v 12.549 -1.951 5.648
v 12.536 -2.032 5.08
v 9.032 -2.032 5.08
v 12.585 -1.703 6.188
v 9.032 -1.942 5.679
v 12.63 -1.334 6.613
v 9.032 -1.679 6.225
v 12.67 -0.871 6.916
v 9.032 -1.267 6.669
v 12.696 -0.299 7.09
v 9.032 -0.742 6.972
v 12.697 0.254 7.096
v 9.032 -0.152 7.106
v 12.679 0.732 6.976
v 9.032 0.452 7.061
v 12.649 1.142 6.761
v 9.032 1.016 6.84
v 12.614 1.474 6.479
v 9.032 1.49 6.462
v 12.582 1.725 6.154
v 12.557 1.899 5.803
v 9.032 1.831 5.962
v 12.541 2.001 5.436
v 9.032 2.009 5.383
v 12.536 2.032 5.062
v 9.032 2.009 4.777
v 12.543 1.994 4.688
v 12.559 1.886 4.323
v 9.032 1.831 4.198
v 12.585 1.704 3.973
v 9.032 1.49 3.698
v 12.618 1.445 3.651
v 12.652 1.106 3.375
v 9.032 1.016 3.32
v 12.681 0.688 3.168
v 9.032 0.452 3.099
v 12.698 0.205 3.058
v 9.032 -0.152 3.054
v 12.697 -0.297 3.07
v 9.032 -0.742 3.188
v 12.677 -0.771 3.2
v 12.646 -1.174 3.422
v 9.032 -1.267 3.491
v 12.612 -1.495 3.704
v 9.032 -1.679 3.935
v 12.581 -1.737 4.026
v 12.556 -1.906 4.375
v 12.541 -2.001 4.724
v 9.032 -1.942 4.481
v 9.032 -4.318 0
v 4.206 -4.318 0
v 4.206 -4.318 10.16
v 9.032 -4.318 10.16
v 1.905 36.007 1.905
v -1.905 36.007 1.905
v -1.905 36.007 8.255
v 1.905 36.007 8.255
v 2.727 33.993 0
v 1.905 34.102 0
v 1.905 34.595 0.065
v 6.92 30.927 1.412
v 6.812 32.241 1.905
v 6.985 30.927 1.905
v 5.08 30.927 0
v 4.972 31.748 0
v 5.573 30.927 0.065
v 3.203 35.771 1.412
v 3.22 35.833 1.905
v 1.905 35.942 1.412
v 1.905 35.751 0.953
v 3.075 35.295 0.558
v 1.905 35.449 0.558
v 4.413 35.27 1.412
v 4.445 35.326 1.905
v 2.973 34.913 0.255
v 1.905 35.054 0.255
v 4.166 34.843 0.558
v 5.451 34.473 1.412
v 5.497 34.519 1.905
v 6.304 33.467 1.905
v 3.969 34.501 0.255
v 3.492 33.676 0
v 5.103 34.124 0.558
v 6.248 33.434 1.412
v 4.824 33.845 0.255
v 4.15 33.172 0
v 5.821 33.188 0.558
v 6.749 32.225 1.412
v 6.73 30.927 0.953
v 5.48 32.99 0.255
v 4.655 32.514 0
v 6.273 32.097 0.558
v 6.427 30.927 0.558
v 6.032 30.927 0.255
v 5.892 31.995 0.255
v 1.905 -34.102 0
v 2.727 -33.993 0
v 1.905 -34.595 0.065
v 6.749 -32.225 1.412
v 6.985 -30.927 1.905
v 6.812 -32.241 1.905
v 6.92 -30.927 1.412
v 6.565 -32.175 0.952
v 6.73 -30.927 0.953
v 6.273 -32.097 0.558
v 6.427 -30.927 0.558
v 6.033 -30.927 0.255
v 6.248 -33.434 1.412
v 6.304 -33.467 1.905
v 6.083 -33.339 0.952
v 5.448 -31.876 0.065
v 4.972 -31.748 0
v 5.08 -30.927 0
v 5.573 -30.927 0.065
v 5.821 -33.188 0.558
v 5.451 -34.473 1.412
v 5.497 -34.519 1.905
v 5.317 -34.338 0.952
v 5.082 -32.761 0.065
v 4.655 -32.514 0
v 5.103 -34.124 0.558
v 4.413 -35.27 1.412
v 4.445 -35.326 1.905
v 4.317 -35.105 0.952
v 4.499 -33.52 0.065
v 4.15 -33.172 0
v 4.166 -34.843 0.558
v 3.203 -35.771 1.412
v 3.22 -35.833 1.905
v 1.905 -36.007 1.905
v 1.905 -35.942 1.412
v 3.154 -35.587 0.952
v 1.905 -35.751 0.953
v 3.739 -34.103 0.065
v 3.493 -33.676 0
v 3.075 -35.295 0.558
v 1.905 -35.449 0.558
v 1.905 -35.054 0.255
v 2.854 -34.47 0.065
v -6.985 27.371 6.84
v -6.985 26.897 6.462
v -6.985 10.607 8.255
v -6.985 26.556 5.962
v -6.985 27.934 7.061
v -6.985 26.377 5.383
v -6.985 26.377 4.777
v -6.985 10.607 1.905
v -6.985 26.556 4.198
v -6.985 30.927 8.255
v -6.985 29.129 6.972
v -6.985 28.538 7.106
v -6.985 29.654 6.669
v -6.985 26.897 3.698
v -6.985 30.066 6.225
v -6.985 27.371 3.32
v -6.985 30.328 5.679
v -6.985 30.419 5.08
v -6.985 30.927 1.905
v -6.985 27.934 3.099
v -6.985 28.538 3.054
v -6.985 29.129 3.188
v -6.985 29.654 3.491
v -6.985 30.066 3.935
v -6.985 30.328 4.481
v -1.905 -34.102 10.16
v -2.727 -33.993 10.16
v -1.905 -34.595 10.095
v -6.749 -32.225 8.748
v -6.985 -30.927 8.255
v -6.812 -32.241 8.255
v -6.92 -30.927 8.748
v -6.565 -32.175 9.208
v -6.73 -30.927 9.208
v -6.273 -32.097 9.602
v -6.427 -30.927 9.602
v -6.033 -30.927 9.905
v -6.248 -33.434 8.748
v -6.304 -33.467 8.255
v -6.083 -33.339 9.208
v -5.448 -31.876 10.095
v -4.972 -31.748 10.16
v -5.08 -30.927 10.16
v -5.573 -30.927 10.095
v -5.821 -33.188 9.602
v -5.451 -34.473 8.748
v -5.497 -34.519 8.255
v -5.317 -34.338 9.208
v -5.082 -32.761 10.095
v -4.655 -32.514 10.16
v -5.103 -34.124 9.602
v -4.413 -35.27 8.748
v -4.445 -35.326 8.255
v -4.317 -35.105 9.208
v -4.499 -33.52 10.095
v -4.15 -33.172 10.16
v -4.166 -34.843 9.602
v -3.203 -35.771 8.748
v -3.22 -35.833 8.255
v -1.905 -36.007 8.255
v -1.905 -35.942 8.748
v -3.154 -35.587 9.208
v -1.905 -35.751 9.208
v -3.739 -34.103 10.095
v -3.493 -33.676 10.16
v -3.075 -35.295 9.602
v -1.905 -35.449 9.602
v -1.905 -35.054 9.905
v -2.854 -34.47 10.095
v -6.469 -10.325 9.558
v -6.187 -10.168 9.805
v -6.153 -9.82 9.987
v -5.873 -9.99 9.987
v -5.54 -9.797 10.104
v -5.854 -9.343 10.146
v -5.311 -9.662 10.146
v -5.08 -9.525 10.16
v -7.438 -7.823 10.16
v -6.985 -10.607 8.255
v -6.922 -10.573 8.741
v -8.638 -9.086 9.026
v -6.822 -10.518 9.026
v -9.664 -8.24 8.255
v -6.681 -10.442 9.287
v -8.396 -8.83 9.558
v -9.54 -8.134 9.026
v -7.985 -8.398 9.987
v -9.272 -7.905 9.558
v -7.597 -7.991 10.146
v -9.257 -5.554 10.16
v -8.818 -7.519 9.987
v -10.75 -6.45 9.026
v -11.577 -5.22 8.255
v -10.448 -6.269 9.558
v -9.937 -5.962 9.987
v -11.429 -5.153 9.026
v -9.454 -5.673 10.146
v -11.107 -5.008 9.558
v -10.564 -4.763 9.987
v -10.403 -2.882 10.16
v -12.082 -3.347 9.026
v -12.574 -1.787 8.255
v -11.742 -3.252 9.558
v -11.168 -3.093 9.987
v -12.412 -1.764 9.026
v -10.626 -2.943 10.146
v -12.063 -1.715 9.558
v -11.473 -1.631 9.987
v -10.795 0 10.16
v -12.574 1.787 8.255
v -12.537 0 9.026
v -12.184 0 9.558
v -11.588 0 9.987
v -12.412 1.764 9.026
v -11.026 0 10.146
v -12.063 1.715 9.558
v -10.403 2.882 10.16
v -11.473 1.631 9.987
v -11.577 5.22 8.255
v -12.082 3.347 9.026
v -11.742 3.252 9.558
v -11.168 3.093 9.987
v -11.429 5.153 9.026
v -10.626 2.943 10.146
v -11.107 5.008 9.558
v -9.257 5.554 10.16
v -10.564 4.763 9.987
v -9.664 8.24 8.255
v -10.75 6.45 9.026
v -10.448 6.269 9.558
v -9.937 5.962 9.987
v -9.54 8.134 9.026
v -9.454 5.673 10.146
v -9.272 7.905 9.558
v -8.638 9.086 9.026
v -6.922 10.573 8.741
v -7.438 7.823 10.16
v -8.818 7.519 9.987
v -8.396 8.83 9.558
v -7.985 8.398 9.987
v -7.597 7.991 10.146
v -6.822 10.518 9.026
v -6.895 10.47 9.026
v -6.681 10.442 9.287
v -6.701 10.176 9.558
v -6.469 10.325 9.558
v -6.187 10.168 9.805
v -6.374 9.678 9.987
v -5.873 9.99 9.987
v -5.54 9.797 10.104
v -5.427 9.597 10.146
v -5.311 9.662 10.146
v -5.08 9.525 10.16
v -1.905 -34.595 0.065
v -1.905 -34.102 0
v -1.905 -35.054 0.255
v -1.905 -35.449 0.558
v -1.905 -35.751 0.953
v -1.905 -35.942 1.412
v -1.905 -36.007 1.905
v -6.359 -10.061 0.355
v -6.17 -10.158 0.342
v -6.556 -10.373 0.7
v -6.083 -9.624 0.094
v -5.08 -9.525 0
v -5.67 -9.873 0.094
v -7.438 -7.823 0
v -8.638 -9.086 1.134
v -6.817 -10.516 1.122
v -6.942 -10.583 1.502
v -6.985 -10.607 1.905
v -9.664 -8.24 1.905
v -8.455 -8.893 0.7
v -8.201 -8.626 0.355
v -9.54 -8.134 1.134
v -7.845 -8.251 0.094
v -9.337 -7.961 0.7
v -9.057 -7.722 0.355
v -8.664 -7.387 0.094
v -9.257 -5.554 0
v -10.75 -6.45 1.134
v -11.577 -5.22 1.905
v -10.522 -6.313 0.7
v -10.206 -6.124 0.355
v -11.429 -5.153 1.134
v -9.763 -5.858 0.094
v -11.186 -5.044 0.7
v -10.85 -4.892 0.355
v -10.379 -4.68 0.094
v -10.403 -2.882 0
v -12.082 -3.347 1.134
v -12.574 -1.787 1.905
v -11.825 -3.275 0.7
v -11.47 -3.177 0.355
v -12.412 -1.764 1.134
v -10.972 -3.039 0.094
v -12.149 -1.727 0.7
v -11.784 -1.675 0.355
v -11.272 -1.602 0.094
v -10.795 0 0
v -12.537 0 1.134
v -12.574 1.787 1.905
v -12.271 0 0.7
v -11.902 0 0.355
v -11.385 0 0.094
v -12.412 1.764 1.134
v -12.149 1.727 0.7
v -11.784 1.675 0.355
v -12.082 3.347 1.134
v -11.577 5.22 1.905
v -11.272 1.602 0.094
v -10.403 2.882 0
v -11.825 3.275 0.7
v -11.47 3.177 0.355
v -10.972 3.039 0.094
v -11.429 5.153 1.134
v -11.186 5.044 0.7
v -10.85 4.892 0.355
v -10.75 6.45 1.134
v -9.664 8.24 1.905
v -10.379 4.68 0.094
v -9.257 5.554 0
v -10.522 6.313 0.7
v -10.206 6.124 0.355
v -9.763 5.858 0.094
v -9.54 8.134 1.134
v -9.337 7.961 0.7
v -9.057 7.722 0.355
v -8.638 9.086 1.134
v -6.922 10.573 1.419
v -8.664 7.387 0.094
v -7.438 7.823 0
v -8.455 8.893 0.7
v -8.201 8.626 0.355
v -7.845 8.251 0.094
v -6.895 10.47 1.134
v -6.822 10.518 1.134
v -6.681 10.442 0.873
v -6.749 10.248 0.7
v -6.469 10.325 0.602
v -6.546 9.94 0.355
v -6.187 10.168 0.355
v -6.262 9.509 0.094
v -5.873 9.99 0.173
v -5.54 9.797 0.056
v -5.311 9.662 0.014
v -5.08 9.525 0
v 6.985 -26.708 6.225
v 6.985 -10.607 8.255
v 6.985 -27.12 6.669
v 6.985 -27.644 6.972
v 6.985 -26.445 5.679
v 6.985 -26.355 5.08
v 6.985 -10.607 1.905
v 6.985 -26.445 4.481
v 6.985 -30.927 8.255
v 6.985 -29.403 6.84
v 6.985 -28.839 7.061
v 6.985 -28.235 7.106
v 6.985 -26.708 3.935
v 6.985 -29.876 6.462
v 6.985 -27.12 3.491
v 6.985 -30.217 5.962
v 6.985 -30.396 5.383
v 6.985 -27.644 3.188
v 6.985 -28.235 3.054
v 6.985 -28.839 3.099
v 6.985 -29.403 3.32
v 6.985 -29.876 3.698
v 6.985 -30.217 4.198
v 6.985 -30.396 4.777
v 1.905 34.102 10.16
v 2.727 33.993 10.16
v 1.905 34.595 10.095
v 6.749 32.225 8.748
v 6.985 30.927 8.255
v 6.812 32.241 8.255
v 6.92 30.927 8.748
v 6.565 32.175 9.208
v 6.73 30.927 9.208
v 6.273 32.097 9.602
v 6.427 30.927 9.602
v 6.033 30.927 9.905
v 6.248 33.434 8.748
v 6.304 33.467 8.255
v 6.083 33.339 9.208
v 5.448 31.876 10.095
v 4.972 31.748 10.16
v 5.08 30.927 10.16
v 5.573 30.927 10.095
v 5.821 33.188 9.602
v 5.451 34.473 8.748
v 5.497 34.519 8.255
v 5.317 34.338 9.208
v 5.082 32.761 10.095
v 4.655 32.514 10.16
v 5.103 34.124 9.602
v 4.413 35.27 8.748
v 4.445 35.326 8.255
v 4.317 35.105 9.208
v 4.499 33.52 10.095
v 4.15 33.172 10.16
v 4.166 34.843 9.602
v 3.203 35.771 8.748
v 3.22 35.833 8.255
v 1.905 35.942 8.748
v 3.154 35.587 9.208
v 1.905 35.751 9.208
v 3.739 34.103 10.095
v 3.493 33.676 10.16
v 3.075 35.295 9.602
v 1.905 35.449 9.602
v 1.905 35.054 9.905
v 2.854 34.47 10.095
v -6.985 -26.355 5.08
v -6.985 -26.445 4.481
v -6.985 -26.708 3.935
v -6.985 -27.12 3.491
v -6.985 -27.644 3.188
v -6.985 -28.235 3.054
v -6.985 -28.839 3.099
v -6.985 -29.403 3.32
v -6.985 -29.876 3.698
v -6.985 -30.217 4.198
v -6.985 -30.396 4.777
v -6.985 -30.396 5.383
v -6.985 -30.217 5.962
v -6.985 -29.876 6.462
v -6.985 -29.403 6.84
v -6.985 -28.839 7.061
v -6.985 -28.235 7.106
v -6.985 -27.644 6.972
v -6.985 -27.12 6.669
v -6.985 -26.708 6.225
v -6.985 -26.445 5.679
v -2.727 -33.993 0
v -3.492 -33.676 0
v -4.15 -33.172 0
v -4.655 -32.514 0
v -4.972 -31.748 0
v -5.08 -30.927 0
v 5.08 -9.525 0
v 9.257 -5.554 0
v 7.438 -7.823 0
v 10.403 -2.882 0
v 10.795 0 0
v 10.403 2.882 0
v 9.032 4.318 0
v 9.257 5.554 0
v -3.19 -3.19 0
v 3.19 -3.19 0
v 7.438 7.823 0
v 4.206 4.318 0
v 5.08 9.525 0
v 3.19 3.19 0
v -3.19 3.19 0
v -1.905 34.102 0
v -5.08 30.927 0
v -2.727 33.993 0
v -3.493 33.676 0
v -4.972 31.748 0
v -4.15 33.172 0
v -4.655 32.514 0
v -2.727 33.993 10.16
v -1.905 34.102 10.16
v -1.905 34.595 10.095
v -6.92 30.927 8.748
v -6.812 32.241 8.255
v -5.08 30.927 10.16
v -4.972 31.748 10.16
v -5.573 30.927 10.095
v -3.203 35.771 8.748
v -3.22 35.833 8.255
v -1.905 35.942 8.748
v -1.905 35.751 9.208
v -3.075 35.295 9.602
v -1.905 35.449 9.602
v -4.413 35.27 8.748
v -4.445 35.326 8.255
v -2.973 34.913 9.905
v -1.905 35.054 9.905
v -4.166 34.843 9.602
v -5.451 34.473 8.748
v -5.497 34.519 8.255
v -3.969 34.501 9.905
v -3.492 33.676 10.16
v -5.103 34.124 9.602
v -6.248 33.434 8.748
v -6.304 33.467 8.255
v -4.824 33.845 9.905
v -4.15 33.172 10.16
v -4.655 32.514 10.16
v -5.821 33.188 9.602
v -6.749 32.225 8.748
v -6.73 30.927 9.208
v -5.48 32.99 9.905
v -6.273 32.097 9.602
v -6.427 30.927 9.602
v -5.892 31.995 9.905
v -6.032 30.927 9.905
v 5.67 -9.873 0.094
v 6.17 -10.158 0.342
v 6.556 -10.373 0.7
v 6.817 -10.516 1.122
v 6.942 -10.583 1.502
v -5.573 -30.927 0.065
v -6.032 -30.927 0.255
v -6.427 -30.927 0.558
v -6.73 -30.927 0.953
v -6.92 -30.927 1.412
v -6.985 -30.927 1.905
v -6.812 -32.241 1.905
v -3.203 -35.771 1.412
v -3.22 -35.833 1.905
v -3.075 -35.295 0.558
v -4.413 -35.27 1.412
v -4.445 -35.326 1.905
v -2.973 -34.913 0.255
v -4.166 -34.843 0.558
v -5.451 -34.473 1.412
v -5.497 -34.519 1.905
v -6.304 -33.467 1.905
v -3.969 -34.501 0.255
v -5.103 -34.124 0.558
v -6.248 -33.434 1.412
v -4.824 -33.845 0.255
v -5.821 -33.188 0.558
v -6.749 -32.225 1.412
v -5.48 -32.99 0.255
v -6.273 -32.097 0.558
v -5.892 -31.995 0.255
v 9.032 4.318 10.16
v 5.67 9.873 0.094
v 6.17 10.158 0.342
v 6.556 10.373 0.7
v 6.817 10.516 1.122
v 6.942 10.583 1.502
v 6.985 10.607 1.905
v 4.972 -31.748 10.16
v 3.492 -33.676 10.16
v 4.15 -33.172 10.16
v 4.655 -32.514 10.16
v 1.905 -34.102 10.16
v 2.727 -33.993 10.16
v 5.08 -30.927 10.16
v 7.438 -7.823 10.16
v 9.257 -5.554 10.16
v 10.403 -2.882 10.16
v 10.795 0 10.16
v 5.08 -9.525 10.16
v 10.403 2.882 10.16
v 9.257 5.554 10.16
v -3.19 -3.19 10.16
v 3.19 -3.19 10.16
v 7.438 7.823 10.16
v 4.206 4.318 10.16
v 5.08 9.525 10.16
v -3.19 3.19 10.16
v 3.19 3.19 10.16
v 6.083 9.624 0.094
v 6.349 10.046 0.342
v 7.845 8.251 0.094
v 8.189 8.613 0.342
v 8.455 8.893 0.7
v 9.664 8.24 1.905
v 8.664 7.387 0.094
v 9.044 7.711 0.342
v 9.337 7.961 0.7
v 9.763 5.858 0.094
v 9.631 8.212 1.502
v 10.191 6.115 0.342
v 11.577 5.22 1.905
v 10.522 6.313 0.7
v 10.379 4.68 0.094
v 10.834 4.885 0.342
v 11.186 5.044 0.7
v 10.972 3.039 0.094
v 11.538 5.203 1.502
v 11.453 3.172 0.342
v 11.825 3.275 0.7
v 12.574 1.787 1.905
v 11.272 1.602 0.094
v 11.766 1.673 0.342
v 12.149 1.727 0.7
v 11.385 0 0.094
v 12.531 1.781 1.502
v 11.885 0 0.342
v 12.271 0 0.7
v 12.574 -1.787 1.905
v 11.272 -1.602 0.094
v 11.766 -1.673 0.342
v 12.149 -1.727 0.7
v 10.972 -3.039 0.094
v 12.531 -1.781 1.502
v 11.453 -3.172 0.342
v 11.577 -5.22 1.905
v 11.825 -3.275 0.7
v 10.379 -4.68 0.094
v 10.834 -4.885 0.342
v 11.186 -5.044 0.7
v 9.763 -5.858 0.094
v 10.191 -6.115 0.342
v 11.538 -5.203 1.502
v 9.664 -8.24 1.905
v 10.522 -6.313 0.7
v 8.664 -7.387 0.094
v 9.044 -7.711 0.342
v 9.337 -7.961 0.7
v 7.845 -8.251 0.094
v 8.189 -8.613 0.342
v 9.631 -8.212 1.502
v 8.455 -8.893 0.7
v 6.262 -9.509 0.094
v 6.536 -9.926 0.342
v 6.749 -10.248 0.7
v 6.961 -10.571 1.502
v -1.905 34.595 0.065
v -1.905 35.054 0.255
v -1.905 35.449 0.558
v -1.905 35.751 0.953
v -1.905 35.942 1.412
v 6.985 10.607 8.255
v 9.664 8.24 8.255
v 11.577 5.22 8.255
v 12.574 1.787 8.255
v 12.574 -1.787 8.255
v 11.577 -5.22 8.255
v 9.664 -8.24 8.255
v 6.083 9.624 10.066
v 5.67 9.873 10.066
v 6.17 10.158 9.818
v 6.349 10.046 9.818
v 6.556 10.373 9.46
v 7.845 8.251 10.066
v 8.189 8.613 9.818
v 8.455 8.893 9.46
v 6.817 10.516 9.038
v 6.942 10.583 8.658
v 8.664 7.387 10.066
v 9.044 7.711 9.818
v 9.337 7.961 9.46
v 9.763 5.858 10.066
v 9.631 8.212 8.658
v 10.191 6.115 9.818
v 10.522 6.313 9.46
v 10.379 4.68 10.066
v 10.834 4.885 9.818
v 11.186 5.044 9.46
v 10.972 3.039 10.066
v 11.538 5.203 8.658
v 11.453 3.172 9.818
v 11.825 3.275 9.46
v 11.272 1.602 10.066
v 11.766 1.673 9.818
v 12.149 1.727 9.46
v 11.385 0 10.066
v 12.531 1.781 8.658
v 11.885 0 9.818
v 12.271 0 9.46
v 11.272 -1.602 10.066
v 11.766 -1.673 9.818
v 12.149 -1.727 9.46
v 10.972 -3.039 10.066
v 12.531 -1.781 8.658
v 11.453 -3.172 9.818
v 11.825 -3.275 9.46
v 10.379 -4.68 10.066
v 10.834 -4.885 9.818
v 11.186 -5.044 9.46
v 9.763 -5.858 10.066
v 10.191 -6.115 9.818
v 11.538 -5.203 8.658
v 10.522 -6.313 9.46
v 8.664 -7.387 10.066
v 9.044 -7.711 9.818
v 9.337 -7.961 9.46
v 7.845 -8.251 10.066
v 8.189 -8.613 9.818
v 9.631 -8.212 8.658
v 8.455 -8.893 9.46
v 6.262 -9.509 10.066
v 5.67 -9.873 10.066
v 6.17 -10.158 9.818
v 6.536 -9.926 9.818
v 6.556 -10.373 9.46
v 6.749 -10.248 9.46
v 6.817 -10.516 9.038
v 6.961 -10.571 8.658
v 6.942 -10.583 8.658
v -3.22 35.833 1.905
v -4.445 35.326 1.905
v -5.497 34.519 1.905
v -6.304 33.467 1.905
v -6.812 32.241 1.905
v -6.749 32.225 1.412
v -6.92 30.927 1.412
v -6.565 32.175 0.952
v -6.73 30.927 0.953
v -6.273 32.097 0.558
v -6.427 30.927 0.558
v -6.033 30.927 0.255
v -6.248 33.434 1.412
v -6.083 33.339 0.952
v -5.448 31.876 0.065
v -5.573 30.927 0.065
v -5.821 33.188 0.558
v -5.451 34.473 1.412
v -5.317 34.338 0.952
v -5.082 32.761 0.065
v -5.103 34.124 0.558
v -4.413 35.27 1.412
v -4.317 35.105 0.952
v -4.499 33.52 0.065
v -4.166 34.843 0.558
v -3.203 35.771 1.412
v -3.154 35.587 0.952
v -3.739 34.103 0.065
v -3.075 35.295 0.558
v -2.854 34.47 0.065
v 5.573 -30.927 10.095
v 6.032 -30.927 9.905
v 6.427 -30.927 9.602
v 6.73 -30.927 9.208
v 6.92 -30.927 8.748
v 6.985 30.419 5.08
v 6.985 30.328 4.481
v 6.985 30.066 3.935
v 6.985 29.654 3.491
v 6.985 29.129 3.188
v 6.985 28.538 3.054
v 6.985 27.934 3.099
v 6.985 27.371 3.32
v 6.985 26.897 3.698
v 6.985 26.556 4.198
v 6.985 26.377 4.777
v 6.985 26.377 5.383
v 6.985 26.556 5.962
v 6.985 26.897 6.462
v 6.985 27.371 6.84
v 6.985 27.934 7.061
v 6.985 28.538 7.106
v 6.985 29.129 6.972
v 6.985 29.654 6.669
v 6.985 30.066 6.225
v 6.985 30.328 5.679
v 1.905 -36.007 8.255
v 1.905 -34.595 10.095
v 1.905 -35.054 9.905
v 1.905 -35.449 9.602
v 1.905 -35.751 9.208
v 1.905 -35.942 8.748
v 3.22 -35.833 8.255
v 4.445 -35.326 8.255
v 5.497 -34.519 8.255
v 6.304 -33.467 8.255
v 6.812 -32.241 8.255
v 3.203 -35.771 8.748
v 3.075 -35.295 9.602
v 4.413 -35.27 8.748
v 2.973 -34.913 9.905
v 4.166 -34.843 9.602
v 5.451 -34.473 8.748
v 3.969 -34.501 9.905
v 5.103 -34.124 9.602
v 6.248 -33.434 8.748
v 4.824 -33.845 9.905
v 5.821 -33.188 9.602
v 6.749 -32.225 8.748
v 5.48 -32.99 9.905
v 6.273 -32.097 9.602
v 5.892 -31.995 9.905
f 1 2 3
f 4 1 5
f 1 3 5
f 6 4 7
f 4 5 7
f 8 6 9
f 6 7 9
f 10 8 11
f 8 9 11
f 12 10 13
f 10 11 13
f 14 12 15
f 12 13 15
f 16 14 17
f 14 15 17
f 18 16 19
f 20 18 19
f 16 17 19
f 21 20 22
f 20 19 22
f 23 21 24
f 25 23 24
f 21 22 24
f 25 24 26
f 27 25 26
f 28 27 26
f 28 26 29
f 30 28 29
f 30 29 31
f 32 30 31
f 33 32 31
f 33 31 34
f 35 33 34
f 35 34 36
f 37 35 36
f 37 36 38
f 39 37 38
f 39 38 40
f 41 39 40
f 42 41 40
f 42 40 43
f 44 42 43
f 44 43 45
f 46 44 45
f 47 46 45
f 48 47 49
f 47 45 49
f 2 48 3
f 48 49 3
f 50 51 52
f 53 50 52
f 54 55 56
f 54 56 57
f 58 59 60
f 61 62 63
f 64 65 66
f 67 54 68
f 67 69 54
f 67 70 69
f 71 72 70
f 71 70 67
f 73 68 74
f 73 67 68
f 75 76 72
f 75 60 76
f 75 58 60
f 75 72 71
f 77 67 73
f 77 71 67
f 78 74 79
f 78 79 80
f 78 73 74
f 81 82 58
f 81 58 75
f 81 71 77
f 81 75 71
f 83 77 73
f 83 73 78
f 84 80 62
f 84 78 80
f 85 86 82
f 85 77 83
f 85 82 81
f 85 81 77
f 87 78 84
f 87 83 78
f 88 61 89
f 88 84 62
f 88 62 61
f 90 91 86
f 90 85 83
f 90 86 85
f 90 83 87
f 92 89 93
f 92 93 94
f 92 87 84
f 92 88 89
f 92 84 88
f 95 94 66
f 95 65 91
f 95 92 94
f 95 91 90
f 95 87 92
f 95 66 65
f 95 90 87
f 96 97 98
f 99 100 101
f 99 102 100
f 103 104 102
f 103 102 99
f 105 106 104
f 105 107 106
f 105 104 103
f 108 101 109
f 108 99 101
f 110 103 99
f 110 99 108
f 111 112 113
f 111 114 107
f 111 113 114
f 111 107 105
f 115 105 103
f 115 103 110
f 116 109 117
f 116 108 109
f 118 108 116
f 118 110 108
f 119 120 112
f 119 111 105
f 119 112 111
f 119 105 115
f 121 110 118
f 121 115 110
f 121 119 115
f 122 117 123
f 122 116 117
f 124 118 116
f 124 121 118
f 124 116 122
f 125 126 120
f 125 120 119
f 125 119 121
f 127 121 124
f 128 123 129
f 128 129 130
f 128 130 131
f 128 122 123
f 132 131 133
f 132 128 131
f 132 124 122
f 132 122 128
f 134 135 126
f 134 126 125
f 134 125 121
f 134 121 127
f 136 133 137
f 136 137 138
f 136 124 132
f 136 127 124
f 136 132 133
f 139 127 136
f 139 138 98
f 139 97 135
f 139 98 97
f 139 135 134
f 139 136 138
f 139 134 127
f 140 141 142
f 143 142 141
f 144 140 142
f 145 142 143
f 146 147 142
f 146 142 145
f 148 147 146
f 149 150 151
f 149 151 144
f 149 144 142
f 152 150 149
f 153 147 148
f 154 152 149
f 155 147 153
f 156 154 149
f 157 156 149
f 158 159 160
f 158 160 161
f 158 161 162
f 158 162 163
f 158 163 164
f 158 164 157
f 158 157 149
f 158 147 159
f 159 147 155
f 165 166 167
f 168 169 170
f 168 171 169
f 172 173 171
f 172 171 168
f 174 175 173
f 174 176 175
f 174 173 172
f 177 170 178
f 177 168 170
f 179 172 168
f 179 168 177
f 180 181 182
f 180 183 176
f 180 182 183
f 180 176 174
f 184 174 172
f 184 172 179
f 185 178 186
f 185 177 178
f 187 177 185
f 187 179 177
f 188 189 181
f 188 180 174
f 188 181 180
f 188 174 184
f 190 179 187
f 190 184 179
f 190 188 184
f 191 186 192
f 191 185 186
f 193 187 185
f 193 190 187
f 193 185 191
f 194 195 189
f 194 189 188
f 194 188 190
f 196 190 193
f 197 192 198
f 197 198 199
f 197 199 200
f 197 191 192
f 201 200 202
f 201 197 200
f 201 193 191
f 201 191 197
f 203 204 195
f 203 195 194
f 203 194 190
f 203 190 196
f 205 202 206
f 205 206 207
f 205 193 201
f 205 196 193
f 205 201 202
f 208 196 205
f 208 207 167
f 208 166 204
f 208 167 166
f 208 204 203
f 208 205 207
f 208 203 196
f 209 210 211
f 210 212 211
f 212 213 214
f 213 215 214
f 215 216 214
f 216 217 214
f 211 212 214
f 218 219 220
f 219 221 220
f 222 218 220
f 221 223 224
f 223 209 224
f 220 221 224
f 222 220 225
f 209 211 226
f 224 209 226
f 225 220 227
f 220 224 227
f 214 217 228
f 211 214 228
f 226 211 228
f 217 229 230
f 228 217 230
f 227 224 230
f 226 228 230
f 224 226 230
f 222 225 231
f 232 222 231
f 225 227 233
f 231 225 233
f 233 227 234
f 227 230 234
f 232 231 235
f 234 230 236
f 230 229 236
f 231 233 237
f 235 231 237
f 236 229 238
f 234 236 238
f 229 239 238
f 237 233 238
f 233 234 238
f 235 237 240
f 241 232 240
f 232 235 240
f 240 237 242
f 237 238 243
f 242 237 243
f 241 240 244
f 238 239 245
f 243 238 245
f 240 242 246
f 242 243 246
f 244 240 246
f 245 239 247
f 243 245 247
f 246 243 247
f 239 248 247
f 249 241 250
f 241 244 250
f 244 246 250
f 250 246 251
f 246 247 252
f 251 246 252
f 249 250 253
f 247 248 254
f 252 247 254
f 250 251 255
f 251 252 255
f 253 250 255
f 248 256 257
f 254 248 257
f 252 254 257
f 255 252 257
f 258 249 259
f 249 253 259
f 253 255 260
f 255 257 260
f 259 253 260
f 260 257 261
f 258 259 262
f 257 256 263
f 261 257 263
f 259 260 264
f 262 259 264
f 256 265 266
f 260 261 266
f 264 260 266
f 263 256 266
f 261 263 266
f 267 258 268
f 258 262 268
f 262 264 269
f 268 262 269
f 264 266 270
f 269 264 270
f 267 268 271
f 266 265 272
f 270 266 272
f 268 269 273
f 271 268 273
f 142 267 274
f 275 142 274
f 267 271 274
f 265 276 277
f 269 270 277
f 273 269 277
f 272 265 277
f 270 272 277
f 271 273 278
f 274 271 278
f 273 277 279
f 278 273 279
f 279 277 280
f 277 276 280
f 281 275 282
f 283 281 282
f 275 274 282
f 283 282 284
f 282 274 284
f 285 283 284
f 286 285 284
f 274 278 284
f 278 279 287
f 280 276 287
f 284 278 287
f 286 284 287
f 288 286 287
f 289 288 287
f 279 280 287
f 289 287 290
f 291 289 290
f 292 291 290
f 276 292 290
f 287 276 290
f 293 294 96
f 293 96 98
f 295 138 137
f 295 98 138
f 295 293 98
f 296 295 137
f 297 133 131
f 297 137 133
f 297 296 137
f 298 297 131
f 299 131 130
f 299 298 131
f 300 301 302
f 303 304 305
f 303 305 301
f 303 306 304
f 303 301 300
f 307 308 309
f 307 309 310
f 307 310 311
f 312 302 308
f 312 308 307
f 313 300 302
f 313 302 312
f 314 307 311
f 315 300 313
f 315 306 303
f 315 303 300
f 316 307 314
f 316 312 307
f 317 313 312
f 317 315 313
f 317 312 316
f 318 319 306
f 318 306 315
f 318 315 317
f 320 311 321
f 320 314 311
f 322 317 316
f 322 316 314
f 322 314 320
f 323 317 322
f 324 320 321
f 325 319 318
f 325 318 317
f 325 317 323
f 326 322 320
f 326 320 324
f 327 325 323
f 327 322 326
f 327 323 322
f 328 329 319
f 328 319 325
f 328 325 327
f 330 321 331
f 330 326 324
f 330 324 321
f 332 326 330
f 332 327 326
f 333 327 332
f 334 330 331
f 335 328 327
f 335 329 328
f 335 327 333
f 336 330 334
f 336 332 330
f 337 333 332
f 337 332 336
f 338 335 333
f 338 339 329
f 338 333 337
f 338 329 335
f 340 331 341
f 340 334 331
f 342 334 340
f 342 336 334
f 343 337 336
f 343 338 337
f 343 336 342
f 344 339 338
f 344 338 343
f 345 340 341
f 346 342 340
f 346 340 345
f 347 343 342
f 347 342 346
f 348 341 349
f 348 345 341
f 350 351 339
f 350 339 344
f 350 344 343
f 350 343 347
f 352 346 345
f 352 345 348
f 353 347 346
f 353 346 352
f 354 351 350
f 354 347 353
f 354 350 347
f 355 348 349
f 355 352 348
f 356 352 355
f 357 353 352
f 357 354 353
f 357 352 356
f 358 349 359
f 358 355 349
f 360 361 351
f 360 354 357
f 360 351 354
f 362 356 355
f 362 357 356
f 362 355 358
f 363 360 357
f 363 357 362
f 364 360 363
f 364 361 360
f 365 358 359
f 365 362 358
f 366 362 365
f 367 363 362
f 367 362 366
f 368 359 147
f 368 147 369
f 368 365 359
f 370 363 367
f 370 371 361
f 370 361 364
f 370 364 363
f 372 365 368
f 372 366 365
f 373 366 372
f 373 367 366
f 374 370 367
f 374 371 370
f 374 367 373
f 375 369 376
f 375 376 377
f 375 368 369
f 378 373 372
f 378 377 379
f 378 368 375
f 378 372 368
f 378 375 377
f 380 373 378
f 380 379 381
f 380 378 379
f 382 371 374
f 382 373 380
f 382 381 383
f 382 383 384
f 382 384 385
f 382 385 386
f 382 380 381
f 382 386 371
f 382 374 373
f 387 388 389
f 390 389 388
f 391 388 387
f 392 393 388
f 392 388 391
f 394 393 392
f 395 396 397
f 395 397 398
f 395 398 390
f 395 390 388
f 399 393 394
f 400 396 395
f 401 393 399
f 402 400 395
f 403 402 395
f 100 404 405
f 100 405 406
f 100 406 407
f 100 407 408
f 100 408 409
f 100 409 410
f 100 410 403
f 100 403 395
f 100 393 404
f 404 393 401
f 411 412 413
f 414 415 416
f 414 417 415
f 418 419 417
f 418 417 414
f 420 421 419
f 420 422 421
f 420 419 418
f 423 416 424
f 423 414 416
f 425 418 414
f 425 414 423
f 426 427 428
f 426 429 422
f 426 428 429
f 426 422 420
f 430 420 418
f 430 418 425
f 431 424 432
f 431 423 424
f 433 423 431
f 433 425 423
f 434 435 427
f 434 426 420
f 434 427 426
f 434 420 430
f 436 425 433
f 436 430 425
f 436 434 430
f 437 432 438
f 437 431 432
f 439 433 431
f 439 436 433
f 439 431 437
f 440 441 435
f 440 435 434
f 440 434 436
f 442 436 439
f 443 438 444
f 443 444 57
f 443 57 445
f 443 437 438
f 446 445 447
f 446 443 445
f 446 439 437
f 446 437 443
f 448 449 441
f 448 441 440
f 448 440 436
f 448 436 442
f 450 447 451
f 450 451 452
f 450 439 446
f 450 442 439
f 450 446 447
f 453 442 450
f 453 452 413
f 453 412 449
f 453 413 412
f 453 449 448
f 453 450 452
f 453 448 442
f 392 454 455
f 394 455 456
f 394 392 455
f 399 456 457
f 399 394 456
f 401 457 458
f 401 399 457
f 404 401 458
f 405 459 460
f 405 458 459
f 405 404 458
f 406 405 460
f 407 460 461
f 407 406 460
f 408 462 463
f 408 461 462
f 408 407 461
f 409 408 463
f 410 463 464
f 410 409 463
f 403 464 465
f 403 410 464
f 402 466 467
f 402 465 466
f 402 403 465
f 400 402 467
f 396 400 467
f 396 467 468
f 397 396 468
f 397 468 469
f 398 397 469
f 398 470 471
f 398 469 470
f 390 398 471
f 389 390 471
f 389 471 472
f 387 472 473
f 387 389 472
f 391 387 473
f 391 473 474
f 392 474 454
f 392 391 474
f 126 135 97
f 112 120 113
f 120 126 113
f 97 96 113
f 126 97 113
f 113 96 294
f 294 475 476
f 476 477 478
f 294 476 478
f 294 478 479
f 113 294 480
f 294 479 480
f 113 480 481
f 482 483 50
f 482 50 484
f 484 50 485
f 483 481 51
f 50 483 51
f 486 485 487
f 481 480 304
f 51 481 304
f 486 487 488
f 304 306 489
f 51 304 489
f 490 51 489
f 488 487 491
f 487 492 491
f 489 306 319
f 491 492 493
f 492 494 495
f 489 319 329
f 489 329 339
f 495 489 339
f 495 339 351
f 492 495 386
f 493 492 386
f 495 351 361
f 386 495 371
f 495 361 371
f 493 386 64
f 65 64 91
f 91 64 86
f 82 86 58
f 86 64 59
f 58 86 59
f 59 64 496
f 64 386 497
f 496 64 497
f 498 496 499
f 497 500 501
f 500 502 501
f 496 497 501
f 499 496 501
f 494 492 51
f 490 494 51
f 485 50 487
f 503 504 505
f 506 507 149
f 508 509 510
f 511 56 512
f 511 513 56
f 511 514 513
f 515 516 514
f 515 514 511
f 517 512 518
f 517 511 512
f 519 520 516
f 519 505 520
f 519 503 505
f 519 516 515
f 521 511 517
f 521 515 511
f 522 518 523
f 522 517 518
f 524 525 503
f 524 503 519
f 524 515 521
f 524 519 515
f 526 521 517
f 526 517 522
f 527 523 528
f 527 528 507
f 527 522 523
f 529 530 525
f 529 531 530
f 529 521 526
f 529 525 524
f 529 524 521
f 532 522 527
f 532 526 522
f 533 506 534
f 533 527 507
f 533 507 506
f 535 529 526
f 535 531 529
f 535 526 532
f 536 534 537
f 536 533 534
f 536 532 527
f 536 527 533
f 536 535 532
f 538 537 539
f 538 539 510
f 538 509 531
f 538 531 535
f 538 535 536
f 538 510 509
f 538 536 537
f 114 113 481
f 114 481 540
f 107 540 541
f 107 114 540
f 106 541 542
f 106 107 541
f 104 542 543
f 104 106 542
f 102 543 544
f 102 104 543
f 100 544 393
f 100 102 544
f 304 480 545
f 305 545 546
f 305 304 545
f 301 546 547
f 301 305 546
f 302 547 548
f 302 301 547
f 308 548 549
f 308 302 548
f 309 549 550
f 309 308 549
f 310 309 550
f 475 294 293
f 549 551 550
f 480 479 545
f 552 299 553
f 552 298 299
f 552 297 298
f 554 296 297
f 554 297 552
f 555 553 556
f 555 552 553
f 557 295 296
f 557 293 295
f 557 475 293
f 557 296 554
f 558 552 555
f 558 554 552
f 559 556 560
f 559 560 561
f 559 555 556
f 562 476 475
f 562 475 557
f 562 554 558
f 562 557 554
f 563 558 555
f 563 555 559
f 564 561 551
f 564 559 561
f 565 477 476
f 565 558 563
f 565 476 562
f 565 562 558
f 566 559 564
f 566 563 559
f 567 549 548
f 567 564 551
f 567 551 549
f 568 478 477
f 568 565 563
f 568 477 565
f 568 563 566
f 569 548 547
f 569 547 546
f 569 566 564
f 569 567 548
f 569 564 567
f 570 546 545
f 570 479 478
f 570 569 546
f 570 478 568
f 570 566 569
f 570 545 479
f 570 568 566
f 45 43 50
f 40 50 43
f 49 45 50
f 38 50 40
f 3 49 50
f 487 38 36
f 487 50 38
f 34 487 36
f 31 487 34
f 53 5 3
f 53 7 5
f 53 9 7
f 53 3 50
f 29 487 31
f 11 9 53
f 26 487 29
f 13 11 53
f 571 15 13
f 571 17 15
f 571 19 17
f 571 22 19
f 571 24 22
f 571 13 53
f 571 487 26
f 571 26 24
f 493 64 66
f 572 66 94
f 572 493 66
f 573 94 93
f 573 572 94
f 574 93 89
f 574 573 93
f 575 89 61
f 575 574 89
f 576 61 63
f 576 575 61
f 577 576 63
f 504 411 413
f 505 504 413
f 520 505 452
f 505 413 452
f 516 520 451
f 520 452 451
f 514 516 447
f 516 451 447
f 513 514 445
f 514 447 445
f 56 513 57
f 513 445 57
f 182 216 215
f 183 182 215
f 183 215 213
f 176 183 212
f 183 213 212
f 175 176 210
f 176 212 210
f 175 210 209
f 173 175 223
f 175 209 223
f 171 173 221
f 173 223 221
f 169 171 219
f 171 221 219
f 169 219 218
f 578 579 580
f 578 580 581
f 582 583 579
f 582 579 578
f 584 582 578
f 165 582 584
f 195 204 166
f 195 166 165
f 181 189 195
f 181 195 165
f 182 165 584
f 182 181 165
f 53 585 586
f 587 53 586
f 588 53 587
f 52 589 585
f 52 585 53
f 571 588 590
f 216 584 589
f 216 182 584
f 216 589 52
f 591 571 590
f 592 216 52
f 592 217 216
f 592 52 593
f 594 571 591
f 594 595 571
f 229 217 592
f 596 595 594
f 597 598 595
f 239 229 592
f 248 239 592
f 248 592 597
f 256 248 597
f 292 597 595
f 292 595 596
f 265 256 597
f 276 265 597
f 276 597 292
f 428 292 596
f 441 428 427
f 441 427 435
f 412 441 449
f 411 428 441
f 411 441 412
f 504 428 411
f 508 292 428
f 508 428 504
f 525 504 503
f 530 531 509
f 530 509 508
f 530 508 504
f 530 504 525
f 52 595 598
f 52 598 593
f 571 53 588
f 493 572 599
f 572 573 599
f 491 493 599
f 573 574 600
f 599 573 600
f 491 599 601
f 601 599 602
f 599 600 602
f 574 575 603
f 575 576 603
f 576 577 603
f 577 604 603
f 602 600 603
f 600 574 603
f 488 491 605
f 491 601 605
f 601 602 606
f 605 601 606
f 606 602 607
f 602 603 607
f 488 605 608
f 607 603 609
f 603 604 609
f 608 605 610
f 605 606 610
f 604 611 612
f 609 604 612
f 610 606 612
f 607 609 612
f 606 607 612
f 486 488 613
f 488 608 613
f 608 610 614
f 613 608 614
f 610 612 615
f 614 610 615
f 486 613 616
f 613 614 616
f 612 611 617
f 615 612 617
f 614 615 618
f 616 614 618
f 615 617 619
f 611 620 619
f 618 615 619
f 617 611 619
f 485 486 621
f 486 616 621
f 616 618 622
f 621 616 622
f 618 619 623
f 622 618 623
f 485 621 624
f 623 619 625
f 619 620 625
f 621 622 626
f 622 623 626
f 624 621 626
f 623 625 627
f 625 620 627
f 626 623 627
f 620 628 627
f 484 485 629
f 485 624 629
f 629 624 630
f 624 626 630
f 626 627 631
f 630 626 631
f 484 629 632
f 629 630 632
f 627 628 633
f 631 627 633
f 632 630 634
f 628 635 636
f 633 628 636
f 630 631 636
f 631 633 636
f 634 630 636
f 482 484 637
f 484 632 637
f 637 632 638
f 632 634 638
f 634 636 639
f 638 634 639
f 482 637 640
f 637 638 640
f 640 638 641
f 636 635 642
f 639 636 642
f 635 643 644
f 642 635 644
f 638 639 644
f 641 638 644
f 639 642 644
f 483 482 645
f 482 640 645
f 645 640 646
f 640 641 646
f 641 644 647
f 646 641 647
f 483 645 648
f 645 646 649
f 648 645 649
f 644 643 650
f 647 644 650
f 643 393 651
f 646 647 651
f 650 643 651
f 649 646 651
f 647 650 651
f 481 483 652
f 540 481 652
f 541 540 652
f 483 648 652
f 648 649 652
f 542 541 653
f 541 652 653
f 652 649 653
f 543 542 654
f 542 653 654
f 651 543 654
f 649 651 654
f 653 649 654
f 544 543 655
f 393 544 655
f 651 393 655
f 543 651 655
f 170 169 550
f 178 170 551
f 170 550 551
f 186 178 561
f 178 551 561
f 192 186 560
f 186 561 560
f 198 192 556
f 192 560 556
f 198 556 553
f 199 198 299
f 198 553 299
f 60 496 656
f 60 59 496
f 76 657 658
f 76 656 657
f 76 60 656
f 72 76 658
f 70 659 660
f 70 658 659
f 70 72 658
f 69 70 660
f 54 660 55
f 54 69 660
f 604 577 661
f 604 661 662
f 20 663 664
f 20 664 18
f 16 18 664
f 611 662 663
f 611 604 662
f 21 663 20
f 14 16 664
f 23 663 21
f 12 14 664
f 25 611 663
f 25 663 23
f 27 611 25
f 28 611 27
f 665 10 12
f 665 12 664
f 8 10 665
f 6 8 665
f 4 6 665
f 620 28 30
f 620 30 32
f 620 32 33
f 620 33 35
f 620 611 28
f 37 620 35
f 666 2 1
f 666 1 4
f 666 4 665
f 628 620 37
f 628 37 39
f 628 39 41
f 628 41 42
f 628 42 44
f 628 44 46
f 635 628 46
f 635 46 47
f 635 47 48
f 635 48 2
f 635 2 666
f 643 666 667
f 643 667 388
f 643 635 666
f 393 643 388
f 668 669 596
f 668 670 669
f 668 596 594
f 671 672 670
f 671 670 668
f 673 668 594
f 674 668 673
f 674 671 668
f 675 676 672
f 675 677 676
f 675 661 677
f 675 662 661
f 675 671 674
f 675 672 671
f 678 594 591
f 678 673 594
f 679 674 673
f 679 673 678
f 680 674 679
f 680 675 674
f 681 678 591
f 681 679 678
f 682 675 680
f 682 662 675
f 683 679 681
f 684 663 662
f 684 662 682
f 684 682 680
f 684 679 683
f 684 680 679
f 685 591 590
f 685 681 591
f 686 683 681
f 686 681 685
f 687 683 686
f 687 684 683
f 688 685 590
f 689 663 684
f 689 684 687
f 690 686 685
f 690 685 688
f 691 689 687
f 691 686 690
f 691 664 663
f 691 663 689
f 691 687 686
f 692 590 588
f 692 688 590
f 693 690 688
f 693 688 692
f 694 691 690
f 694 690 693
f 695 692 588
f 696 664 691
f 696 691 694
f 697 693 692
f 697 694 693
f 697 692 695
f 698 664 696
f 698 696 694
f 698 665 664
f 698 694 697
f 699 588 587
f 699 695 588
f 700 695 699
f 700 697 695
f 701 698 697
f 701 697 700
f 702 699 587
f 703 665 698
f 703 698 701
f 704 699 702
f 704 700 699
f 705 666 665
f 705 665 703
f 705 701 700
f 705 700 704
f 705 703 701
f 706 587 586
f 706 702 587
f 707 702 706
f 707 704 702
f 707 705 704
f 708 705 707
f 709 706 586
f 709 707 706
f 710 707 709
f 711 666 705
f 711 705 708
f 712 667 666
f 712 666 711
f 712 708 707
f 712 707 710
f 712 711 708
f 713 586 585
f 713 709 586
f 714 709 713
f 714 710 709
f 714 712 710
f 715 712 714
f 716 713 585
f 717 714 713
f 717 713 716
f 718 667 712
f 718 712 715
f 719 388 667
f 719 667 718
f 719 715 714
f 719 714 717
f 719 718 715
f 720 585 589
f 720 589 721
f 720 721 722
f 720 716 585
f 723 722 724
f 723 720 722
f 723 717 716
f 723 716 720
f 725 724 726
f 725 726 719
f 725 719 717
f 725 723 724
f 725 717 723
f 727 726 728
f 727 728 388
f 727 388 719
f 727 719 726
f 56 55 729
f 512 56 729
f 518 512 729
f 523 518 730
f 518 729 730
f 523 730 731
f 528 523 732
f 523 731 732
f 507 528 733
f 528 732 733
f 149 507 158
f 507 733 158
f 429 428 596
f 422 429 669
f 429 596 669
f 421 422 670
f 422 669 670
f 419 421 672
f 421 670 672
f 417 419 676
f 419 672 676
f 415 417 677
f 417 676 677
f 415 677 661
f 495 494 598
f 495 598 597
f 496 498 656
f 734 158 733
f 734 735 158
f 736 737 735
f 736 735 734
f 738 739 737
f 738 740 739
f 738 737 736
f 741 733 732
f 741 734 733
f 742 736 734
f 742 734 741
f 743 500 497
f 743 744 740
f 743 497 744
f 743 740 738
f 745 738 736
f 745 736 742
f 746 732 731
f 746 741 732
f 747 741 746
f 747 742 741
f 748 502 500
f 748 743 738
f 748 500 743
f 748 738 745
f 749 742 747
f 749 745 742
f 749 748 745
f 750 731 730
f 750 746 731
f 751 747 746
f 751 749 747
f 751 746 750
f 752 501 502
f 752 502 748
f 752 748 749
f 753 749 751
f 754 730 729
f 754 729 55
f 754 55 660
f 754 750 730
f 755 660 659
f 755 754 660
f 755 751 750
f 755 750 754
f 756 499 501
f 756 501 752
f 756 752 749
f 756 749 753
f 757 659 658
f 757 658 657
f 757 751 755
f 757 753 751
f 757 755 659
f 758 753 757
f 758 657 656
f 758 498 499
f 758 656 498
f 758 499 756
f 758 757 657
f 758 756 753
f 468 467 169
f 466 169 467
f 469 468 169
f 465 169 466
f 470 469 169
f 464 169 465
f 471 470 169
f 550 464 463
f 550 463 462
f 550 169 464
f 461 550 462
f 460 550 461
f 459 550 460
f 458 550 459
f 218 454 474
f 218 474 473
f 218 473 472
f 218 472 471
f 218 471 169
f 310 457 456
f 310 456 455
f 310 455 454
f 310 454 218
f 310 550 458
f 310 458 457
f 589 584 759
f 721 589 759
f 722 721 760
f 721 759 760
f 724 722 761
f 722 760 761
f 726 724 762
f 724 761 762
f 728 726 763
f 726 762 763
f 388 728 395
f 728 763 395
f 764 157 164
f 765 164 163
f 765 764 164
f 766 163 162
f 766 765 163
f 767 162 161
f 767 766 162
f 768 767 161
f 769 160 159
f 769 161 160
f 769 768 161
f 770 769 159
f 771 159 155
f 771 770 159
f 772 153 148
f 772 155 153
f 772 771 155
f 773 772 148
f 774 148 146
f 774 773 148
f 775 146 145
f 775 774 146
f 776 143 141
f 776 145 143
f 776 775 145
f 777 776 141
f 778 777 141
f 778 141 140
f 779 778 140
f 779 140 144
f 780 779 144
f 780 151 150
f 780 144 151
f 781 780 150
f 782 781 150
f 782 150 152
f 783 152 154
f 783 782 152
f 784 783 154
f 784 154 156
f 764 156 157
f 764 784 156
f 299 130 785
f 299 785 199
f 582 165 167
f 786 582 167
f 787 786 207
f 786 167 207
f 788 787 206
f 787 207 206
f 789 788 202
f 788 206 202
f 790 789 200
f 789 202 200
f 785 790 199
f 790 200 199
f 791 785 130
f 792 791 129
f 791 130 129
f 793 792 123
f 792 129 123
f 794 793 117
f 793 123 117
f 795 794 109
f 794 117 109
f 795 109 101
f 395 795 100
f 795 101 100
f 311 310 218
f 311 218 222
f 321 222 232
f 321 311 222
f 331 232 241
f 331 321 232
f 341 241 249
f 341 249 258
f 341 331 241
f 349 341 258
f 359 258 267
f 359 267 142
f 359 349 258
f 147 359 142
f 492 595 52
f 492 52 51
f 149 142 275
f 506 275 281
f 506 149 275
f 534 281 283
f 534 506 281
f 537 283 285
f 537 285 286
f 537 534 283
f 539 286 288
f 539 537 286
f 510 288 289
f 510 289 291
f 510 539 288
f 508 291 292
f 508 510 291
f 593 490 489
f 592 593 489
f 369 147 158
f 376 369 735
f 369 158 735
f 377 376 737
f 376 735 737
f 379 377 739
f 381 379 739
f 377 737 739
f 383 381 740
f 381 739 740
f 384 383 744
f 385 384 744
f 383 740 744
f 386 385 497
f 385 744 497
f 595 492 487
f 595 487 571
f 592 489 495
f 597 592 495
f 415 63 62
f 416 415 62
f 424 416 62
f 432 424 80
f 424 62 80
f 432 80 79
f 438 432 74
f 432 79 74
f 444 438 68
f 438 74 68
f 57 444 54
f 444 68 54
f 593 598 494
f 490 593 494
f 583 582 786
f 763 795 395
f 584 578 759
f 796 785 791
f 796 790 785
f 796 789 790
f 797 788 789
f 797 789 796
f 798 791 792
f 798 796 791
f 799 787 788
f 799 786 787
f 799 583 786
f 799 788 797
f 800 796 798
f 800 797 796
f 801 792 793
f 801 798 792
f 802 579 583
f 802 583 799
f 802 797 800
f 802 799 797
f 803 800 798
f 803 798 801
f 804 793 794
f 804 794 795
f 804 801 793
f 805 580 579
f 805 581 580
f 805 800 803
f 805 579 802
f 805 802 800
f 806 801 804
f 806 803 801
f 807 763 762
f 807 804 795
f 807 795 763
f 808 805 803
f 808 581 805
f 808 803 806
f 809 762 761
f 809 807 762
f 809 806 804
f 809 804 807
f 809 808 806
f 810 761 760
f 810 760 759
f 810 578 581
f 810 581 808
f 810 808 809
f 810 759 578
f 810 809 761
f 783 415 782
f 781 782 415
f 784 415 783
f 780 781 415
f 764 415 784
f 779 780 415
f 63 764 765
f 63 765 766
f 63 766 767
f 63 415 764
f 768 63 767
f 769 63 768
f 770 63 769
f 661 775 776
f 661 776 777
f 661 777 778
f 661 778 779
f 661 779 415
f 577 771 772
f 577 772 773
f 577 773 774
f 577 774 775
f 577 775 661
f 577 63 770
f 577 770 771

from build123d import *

# Parameters (mm, degrees)
SKETCH2_R           = 2.032
BOSS_EXTRUDE1_DEPTH = 10.16
SKETCH3_W           = 6.38
SKETCH3_H           = 6.38
CUT_EXTRUDE1_DEPTH  = 40.509368553
SKETCH4_R           = 2.032
CUT_EXTRUDE2_DEPTH  = 24.13
FILLET3_R           = 1.905
FILLET1_R           = 5.08
SKETCH5_R           = 2.032
CUT_EXTRUDE3_DEPTH  = 41.64716852
SKETCH7_W           = 10.16
SKETCH7_H           = 8.636
CUT_EXTRUDE4_DEPTH  = 5.842
SKETCH8_W           = 10.16
SKETCH8_H           = 8.636
BOSS_EXTRUDE2_DEPTH = 1.016


with BuildPart() as part:
    # Sketch2 → Boss-Extrude1 (new body)
    with BuildSketch(Plane.XY):
        with BuildLine():
            Line((-6.985, 10.606591111), (-6.985, 36.006591111))
            Line((-6.985, 36.006591111), (6.985, 36.006591111))
            Line((6.985, 36.006591111), (6.985, 10.606591111))
            ThreePointArc((6.985, 10.606591111), (12.7, 0), (6.985, -10.606591111))
            Line((6.985, -10.606591111), (6.985, -36.006591111))
            Line((6.985, -36.006591111), (-6.985, -36.006591111))
            Line((-6.985, -36.006591111), (-6.985, -10.606591111))
            ThreePointArc((-6.985, -10.606591111), (-12.7, 0), (-6.985, 10.606591111))
        make_face()
        Circle(SKETCH2_R, mode=Mode.SUBTRACT)
    extrude(amount=BOSS_EXTRUDE1_DEPTH)

    # Sketch3 → Cut-Extrude1 (cut, through all)
    with BuildSketch(Plane(origin=(0, 0, 0), x_dir=(-1, 0, 0), z_dir=(0, 0, -1))):
        Rectangle(SKETCH3_W, SKETCH3_H)
    extrude(amount=-CUT_EXTRUDE1_DEPTH, mode=Mode.SUBTRACT)

    # Sketch4 → Cut-Extrude2 (cut)
    with BuildSketch(Plane(origin=(6.985, 0, 3.175), x_dir=(0, 0, 1), z_dir=(-1, 0, 0))):
        with Locations(Location((1.905, 28.386591111, 0), (0, 0, 90))):
            Circle(SKETCH4_R)
        with Locations(Location((1.905, -28.386591111, 0), (0, 0, 90))):
            Circle(SKETCH4_R)
    extrude(amount=CUT_EXTRUDE2_DEPTH, mode=Mode.SUBTRACT)

    # Fillet3
    fillet3_edges = [part.edges().sort_by_distance(p)[0] for p in [
        (6.985, 23.306591111, 0),
        (12.7, 0, 0),
        (6.985, -23.306591111, 0),
        (0, -36.006591111, 0),
        (12.7, 0, 10.16),
        (6.985, 23.306591111, 10.16),
        (0, 36.006591111, 10.16),
        (-6.985, 23.306591111, 10.16),
        (-12.7, 0, 10.16),
        (-6.985, -23.306591111, 10.16),
        (0, -36.006591111, 10.16),
        (-6.985, -23.306591111, 0),
        (6.985, -23.306591111, 10.16),
        (-12.7, 0, 0),
        (-6.985, 23.306591111, 0),
        (0, 36.006591111, 0),
    ]]
    fillet(fillet3_edges, radius=FILLET3_R)

    # Fillet1
    # the kernel refuses this fillet: 5.08 mm, written as the material it takes off along each edge
    with BuildSketch(Plane(origin=(-1.905, 30.926591111, 0), x_dir=(-1, 0, 0), z_dir=(0, -1, 0))) as fillet1_piece_1:
        with BuildLine():
            CenterArc((3.175, -1.905), 1.905, 0, 90)
            Line((5.08, -1.905), (5.08, 0))
            Line((5.08, 0), (3.175, 0))
        make_face()
    revolve(axis=Axis((-1.905, 30.926591111, 0), (0, 0, -1)), revolution_arc=90, mode=Mode.SUBTRACT)
    with BuildSketch(Plane(origin=(1.905, 30.926591111, 0), x_dir=(0, 1, 0), z_dir=(-1, 0, 0))) as fillet1_piece_2:
        with BuildLine():
            CenterArc((3.175, -1.905), 1.905, 0, 90)
            Line((5.08, -1.905), (5.08, 0))
            Line((5.08, 0), (3.175, 0))
        make_face()
    revolve(axis=Axis((1.905, 30.926591111, 0), (0, 0, -1)), revolution_arc=90, mode=Mode.SUBTRACT)
    with BuildSketch(Plane(origin=(-1.905, -30.926591111, 0), x_dir=(0, -1, 0), z_dir=(1, 0, 0))) as fillet1_piece_3:
        with BuildLine():
            CenterArc((3.175, -1.905), 1.905, 0, 90)
            Line((5.08, -1.905), (5.08, 0))
            Line((5.08, 0), (3.175, 0))
        make_face()
    revolve(axis=Axis((-1.905, -30.926591111, 0), (0, 0, -1)), revolution_arc=90, mode=Mode.SUBTRACT)
    with BuildSketch(Plane(origin=(1.905, -30.926591111, 0), x_dir=(1, 0, 0), z_dir=(0, 1, 0))) as fillet1_piece_4:
        with BuildLine():
            CenterArc((3.175, -1.905), 1.905, 0, 90)
            Line((5.08, -1.905), (5.08, 0))
            Line((5.08, 0), (3.175, 0))
        make_face()
    revolve(axis=Axis((1.905, -30.926591111, 0), (0, 0, -1)), revolution_arc=90, mode=Mode.SUBTRACT)
    with BuildSketch(Plane(origin=(-1.905, 30.926591111, 10.16), x_dir=(0, 1, 0), z_dir=(1, 0, 0))) as fillet1_piece_5:
        with BuildLine():
            CenterArc((3.175, -1.905), 1.905, 0, 90)
            Line((5.08, -1.905), (5.08, 0))
            Line((5.08, 0), (3.175, 0))
        make_face()
    revolve(axis=Axis((-1.905, 30.926591111, 10.16), (0, 0, 1)), revolution_arc=90, mode=Mode.SUBTRACT)
    with BuildSketch(Plane(origin=(1.905, 30.926591111, 10.16), x_dir=(1, 0, 0), z_dir=(0, -1, 0))) as fillet1_piece_6:
        with BuildLine():
            CenterArc((3.175, -1.905), 1.905, 0, 90)
            Line((5.08, -1.905), (5.08, 0))
            Line((5.08, 0), (3.175, 0))
        make_face()
    revolve(axis=Axis((1.905, 30.926591111, 10.16), (0, 0, 1)), revolution_arc=90, mode=Mode.SUBTRACT)
    with BuildSketch(Plane(origin=(-1.905, -30.926591111, 10.16), x_dir=(-1, 0, 0), z_dir=(0, 1, 0))) as fillet1_piece_7:
        with BuildLine():
            CenterArc((3.175, -1.905), 1.905, 0, 90)
            Line((5.08, -1.905), (5.08, 0))
            Line((5.08, 0), (3.175, 0))
        make_face()
    revolve(axis=Axis((-1.905, -30.926591111, 10.16), (0, 0, 1)), revolution_arc=90, mode=Mode.SUBTRACT)
    with BuildSketch(Plane(origin=(1.905, -30.926591111, 10.16), x_dir=(0, -1, 0), z_dir=(-1, 0, 0))) as fillet1_piece_8:
        with BuildLine():
            CenterArc((3.175, -1.905), 1.905, 0, 90)
            Line((5.08, -1.905), (5.08, 0))
            Line((5.08, 0), (3.175, 0))
        make_face()
    revolve(axis=Axis((1.905, -30.926591111, 10.16), (0, 0, 1)), revolution_arc=90, mode=Mode.SUBTRACT)
    with BuildSketch(Plane(origin=(6.985, -36.006591111, 0), x_dir=(-1, 0, 0), z_dir=(0, 0, 1)), Plane(origin=(-6.985, -36.006591111, 0), x_dir=(0, 1, 0), z_dir=(0, 0, 1))) as fillet1_piece_9:
        with BuildLine():
            CenterArc((FILLET1_R, -FILLET1_R), FILLET1_R, 90, 90)
            Line((0, -FILLET1_R), (0, 0))
            Line((0, 0), (FILLET1_R, 0))
        make_face()
    extrude(amount=10.16, mode=Mode.SUBTRACT)
    with BuildSketch(Plane(origin=(-6.985, 36.006591111, 0), x_dir=(0, -1, 0), z_dir=(0, 0, 1)), Plane(origin=(6.985, 36.006591111, 0), x_dir=(-1, 0, 0), z_dir=(0, 0, 1))) as fillet1_piece_10:
        with BuildLine():
            CenterArc((FILLET1_R, FILLET1_R), FILLET1_R, 180, 90)
            Line((0, FILLET1_R), (0, 0))
            Line((0, 0), (FILLET1_R, 0))
        make_face()
    extrude(amount=10.16, mode=Mode.SUBTRACT)

    # Sketch5 → Cut-Extrude3 (cut, through all)
    with BuildSketch(Plane.ZY.offset(-3.19)):
        with Locations(Location((5.08, 0, 0), (0, 0, 270))):
            Circle(SKETCH5_R)
    extrude(amount=-CUT_EXTRUDE3_DEPTH, mode=Mode.SUBTRACT)

    # Sketch7 → Cut-Extrude4 (cut)
    with BuildSketch(Plane.ZY.offset(-3.19)):
        with Locations((5.08, 0)):
            Rectangle(SKETCH7_W, SKETCH7_H)
    extrude(amount=-CUT_EXTRUDE4_DEPTH, mode=Mode.SUBTRACT)

    # Sketch8 → Boss-Extrude2 (add)
    with BuildSketch(Plane(origin=(3.19, 0, 0), x_dir=(0, 0, -1), z_dir=(1, 0, 0))):
        with Locations((-5.08, 0)):
            Rectangle(SKETCH8_W, SKETCH8_H)
    extrude(amount=BOSS_EXTRUDE2_DEPTH)


solid = part.part
